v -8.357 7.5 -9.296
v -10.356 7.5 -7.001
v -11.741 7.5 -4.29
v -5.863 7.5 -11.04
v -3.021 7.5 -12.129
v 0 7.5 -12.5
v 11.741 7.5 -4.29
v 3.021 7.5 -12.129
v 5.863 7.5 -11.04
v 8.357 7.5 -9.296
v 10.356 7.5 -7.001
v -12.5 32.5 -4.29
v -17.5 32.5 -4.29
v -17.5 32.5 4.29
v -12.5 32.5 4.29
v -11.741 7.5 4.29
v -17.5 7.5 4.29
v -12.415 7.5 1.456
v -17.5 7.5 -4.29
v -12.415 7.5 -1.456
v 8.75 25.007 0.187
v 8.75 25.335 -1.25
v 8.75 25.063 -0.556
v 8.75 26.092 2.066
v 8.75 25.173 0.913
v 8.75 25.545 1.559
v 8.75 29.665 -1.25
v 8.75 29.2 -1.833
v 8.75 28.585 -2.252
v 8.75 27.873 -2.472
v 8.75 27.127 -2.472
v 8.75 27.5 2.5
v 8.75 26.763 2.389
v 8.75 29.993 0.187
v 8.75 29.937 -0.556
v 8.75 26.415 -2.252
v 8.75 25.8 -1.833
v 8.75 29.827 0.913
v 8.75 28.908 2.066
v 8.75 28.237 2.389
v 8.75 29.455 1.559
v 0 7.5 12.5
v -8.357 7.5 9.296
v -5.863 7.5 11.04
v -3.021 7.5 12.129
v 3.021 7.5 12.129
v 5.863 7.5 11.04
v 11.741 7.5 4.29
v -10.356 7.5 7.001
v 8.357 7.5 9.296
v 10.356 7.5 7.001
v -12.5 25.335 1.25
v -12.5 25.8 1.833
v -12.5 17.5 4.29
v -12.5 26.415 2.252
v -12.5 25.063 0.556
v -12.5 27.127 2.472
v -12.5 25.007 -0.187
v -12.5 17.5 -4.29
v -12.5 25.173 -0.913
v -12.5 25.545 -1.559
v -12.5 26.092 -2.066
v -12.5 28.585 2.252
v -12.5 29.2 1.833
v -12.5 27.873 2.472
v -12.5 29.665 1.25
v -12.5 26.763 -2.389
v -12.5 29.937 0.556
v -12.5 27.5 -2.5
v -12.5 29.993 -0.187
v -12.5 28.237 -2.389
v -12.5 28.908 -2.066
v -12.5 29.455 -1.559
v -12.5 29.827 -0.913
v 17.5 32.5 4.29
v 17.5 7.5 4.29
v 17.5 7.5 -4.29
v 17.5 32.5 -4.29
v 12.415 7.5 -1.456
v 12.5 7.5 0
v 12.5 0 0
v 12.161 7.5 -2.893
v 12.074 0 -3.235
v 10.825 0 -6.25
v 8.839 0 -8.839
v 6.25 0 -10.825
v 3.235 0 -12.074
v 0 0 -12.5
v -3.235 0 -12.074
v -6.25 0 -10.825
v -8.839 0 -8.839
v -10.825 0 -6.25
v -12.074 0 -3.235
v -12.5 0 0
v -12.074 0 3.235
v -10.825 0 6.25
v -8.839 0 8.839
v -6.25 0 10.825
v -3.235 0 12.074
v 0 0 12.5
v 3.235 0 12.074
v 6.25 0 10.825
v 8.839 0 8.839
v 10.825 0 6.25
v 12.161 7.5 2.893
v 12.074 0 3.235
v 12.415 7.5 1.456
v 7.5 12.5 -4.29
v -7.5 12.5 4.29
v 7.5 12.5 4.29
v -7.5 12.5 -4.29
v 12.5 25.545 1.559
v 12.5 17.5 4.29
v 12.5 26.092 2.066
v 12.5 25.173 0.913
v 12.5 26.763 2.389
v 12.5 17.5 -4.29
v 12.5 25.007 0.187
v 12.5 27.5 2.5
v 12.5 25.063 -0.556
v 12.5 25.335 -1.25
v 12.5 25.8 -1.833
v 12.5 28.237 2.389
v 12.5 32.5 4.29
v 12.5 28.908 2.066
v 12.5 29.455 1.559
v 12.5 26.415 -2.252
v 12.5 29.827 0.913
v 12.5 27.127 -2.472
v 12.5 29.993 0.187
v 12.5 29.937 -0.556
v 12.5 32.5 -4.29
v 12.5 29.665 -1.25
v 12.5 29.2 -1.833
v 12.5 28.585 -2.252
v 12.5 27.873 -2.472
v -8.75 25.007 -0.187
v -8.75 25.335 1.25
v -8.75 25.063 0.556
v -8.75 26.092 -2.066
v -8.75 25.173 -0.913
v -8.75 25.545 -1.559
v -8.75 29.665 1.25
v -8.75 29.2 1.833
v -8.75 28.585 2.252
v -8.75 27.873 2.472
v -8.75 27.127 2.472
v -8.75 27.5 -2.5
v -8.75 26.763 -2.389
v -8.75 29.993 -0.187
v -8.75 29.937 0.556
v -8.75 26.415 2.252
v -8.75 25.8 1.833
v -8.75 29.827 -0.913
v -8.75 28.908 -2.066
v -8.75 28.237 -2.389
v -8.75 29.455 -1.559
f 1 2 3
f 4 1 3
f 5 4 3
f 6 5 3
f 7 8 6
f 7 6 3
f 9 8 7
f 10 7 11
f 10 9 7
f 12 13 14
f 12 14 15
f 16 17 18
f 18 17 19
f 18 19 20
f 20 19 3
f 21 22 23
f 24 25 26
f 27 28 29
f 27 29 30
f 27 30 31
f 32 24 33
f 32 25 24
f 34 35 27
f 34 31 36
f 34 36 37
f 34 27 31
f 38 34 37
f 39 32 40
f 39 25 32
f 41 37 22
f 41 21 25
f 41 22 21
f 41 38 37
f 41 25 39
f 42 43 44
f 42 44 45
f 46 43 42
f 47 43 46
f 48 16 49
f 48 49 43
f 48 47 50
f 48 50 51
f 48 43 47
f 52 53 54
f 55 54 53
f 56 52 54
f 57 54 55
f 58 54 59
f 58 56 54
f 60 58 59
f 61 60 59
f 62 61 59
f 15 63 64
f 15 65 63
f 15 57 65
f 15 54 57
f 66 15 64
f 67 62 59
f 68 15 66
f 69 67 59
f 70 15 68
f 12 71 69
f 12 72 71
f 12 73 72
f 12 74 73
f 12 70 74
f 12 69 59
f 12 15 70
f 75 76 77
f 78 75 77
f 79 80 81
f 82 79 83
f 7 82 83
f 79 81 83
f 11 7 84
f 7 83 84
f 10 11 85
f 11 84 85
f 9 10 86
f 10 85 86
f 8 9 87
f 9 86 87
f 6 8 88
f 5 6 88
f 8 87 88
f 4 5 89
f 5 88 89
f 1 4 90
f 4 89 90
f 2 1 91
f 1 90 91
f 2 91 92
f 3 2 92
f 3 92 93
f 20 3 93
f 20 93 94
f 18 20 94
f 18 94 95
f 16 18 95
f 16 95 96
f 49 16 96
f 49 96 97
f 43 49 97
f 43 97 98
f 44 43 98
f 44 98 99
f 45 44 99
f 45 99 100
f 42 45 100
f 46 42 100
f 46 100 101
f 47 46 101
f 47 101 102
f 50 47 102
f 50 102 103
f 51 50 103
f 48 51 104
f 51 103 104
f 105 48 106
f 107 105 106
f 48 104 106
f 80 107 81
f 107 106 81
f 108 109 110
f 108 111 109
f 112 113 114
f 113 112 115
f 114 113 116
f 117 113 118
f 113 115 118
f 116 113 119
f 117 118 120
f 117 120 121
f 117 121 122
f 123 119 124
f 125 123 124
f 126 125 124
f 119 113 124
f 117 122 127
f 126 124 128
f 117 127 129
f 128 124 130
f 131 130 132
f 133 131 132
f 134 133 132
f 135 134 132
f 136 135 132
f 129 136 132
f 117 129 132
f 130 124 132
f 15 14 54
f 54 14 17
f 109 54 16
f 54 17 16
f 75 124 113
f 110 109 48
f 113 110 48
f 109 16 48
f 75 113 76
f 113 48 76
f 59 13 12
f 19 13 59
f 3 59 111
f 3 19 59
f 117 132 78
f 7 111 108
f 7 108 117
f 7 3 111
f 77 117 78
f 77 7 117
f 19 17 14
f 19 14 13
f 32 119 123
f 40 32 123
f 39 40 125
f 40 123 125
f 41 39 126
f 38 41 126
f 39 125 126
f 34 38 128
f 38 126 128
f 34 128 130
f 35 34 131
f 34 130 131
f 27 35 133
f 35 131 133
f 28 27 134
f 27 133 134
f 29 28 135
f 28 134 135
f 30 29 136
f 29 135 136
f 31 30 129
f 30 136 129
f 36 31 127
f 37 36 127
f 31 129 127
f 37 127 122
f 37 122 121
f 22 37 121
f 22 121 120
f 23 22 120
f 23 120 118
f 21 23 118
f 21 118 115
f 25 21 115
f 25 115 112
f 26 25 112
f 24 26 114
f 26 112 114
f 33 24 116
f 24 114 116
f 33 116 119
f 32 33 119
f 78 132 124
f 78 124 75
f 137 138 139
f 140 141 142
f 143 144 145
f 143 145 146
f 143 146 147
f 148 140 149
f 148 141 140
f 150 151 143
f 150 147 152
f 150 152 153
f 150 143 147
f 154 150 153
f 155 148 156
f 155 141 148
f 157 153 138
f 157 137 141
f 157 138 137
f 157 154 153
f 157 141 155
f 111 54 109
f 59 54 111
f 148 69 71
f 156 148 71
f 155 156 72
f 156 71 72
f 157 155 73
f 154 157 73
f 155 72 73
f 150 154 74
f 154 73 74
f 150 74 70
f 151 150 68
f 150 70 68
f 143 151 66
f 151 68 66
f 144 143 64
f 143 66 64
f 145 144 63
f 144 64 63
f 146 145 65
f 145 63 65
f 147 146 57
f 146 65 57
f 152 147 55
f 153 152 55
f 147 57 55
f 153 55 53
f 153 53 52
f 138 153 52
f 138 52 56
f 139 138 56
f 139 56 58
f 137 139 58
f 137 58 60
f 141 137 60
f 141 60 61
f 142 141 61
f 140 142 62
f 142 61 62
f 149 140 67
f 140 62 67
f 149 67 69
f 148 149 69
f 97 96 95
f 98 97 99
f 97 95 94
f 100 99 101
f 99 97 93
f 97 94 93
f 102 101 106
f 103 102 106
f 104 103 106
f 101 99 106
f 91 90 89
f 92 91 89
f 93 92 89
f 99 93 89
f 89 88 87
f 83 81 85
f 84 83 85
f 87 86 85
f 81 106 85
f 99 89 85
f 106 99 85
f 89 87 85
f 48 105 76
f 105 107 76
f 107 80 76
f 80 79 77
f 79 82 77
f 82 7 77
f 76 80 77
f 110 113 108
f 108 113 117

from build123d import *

# Parameters (mm, degrees)
SKETCH1_R           = 12.5
BOSS_EXTRUDE1_DEPTH = 7.5
SKETCH2_W           = 35
SKETCH2_H           = 8.580767914
BOSS_EXTRUDE2_DEPTH = 25
SKETCH3_W           = 25
SKETCH3_H           = 8.580767914
CUT_EXTRUDE1_DEPTH  = 20
SKETCH4_R           = 2.5
BOSS_EXTRUDE3_DEPTH = 3.75
SKETCH5_R           = 2.5
BOSS_EXTRUDE4_DEPTH = 3.75
CHAMFER1_SIZE       = 5
CHAMFER2_SIZE       = 5


with BuildPart() as part:
    # Sketch1 → Boss-Extrude1 (new body)
    with BuildSketch(Plane(origin=(0, 0, 0), x_dir=(1, 0, 0), z_dir=(0, 1, 0))):
        Circle(SKETCH1_R)
    extrude(amount=BOSS_EXTRUDE1_DEPTH)

    # Sketch2 → Boss-Extrude2 (add)
    with BuildSketch(Plane(origin=(0, 7.5, 0), x_dir=(1, 0, 0), z_dir=(0, 1, 0))):
        Rectangle(SKETCH2_W, SKETCH2_H)
    extrude(amount=BOSS_EXTRUDE2_DEPTH)

    # Sketch3 → Cut-Extrude1 (cut)
    with BuildSketch(Plane(origin=(0, 32.5, 0), x_dir=(1, 0, 0), z_dir=(0, 1, 0))):
        Rectangle(SKETCH3_W, SKETCH3_H)
    extrude(amount=-CUT_EXTRUDE1_DEPTH, mode=Mode.SUBTRACT)

    # Sketch4 → Boss-Extrude3 (add)
    with BuildSketch(Plane(origin=(-12.5, 0, 0), x_dir=(0, 0, -1), z_dir=(1, 0, 0))):
        with Locations((0, 27.5)):
            Circle(SKETCH4_R)
    extrude(amount=BOSS_EXTRUDE3_DEPTH)

    # Sketch5 → Boss-Extrude4 (add)
    with BuildSketch(Plane.ZY.offset(-12.5)):
        with Locations((0, 27.5)):
            Circle(SKETCH5_R)
    extrude(amount=BOSS_EXTRUDE4_DEPTH)

    # Chamfer1
    chamfer1_edges = [part.edges().sort_by_distance(p)[0] for p in [
        (-12.5, 12.5, 0),
    ]]
    chamfer(chamfer1_edges, length=CHAMFER1_SIZE)

    # Chamfer2
    chamfer2_edges = [part.edges().sort_by_distance(p)[0] for p in [
        (12.5, 12.5, 0),
    ]]
    chamfer(chamfer2_edges, length=CHAMFER2_SIZE)


solid = part.part
